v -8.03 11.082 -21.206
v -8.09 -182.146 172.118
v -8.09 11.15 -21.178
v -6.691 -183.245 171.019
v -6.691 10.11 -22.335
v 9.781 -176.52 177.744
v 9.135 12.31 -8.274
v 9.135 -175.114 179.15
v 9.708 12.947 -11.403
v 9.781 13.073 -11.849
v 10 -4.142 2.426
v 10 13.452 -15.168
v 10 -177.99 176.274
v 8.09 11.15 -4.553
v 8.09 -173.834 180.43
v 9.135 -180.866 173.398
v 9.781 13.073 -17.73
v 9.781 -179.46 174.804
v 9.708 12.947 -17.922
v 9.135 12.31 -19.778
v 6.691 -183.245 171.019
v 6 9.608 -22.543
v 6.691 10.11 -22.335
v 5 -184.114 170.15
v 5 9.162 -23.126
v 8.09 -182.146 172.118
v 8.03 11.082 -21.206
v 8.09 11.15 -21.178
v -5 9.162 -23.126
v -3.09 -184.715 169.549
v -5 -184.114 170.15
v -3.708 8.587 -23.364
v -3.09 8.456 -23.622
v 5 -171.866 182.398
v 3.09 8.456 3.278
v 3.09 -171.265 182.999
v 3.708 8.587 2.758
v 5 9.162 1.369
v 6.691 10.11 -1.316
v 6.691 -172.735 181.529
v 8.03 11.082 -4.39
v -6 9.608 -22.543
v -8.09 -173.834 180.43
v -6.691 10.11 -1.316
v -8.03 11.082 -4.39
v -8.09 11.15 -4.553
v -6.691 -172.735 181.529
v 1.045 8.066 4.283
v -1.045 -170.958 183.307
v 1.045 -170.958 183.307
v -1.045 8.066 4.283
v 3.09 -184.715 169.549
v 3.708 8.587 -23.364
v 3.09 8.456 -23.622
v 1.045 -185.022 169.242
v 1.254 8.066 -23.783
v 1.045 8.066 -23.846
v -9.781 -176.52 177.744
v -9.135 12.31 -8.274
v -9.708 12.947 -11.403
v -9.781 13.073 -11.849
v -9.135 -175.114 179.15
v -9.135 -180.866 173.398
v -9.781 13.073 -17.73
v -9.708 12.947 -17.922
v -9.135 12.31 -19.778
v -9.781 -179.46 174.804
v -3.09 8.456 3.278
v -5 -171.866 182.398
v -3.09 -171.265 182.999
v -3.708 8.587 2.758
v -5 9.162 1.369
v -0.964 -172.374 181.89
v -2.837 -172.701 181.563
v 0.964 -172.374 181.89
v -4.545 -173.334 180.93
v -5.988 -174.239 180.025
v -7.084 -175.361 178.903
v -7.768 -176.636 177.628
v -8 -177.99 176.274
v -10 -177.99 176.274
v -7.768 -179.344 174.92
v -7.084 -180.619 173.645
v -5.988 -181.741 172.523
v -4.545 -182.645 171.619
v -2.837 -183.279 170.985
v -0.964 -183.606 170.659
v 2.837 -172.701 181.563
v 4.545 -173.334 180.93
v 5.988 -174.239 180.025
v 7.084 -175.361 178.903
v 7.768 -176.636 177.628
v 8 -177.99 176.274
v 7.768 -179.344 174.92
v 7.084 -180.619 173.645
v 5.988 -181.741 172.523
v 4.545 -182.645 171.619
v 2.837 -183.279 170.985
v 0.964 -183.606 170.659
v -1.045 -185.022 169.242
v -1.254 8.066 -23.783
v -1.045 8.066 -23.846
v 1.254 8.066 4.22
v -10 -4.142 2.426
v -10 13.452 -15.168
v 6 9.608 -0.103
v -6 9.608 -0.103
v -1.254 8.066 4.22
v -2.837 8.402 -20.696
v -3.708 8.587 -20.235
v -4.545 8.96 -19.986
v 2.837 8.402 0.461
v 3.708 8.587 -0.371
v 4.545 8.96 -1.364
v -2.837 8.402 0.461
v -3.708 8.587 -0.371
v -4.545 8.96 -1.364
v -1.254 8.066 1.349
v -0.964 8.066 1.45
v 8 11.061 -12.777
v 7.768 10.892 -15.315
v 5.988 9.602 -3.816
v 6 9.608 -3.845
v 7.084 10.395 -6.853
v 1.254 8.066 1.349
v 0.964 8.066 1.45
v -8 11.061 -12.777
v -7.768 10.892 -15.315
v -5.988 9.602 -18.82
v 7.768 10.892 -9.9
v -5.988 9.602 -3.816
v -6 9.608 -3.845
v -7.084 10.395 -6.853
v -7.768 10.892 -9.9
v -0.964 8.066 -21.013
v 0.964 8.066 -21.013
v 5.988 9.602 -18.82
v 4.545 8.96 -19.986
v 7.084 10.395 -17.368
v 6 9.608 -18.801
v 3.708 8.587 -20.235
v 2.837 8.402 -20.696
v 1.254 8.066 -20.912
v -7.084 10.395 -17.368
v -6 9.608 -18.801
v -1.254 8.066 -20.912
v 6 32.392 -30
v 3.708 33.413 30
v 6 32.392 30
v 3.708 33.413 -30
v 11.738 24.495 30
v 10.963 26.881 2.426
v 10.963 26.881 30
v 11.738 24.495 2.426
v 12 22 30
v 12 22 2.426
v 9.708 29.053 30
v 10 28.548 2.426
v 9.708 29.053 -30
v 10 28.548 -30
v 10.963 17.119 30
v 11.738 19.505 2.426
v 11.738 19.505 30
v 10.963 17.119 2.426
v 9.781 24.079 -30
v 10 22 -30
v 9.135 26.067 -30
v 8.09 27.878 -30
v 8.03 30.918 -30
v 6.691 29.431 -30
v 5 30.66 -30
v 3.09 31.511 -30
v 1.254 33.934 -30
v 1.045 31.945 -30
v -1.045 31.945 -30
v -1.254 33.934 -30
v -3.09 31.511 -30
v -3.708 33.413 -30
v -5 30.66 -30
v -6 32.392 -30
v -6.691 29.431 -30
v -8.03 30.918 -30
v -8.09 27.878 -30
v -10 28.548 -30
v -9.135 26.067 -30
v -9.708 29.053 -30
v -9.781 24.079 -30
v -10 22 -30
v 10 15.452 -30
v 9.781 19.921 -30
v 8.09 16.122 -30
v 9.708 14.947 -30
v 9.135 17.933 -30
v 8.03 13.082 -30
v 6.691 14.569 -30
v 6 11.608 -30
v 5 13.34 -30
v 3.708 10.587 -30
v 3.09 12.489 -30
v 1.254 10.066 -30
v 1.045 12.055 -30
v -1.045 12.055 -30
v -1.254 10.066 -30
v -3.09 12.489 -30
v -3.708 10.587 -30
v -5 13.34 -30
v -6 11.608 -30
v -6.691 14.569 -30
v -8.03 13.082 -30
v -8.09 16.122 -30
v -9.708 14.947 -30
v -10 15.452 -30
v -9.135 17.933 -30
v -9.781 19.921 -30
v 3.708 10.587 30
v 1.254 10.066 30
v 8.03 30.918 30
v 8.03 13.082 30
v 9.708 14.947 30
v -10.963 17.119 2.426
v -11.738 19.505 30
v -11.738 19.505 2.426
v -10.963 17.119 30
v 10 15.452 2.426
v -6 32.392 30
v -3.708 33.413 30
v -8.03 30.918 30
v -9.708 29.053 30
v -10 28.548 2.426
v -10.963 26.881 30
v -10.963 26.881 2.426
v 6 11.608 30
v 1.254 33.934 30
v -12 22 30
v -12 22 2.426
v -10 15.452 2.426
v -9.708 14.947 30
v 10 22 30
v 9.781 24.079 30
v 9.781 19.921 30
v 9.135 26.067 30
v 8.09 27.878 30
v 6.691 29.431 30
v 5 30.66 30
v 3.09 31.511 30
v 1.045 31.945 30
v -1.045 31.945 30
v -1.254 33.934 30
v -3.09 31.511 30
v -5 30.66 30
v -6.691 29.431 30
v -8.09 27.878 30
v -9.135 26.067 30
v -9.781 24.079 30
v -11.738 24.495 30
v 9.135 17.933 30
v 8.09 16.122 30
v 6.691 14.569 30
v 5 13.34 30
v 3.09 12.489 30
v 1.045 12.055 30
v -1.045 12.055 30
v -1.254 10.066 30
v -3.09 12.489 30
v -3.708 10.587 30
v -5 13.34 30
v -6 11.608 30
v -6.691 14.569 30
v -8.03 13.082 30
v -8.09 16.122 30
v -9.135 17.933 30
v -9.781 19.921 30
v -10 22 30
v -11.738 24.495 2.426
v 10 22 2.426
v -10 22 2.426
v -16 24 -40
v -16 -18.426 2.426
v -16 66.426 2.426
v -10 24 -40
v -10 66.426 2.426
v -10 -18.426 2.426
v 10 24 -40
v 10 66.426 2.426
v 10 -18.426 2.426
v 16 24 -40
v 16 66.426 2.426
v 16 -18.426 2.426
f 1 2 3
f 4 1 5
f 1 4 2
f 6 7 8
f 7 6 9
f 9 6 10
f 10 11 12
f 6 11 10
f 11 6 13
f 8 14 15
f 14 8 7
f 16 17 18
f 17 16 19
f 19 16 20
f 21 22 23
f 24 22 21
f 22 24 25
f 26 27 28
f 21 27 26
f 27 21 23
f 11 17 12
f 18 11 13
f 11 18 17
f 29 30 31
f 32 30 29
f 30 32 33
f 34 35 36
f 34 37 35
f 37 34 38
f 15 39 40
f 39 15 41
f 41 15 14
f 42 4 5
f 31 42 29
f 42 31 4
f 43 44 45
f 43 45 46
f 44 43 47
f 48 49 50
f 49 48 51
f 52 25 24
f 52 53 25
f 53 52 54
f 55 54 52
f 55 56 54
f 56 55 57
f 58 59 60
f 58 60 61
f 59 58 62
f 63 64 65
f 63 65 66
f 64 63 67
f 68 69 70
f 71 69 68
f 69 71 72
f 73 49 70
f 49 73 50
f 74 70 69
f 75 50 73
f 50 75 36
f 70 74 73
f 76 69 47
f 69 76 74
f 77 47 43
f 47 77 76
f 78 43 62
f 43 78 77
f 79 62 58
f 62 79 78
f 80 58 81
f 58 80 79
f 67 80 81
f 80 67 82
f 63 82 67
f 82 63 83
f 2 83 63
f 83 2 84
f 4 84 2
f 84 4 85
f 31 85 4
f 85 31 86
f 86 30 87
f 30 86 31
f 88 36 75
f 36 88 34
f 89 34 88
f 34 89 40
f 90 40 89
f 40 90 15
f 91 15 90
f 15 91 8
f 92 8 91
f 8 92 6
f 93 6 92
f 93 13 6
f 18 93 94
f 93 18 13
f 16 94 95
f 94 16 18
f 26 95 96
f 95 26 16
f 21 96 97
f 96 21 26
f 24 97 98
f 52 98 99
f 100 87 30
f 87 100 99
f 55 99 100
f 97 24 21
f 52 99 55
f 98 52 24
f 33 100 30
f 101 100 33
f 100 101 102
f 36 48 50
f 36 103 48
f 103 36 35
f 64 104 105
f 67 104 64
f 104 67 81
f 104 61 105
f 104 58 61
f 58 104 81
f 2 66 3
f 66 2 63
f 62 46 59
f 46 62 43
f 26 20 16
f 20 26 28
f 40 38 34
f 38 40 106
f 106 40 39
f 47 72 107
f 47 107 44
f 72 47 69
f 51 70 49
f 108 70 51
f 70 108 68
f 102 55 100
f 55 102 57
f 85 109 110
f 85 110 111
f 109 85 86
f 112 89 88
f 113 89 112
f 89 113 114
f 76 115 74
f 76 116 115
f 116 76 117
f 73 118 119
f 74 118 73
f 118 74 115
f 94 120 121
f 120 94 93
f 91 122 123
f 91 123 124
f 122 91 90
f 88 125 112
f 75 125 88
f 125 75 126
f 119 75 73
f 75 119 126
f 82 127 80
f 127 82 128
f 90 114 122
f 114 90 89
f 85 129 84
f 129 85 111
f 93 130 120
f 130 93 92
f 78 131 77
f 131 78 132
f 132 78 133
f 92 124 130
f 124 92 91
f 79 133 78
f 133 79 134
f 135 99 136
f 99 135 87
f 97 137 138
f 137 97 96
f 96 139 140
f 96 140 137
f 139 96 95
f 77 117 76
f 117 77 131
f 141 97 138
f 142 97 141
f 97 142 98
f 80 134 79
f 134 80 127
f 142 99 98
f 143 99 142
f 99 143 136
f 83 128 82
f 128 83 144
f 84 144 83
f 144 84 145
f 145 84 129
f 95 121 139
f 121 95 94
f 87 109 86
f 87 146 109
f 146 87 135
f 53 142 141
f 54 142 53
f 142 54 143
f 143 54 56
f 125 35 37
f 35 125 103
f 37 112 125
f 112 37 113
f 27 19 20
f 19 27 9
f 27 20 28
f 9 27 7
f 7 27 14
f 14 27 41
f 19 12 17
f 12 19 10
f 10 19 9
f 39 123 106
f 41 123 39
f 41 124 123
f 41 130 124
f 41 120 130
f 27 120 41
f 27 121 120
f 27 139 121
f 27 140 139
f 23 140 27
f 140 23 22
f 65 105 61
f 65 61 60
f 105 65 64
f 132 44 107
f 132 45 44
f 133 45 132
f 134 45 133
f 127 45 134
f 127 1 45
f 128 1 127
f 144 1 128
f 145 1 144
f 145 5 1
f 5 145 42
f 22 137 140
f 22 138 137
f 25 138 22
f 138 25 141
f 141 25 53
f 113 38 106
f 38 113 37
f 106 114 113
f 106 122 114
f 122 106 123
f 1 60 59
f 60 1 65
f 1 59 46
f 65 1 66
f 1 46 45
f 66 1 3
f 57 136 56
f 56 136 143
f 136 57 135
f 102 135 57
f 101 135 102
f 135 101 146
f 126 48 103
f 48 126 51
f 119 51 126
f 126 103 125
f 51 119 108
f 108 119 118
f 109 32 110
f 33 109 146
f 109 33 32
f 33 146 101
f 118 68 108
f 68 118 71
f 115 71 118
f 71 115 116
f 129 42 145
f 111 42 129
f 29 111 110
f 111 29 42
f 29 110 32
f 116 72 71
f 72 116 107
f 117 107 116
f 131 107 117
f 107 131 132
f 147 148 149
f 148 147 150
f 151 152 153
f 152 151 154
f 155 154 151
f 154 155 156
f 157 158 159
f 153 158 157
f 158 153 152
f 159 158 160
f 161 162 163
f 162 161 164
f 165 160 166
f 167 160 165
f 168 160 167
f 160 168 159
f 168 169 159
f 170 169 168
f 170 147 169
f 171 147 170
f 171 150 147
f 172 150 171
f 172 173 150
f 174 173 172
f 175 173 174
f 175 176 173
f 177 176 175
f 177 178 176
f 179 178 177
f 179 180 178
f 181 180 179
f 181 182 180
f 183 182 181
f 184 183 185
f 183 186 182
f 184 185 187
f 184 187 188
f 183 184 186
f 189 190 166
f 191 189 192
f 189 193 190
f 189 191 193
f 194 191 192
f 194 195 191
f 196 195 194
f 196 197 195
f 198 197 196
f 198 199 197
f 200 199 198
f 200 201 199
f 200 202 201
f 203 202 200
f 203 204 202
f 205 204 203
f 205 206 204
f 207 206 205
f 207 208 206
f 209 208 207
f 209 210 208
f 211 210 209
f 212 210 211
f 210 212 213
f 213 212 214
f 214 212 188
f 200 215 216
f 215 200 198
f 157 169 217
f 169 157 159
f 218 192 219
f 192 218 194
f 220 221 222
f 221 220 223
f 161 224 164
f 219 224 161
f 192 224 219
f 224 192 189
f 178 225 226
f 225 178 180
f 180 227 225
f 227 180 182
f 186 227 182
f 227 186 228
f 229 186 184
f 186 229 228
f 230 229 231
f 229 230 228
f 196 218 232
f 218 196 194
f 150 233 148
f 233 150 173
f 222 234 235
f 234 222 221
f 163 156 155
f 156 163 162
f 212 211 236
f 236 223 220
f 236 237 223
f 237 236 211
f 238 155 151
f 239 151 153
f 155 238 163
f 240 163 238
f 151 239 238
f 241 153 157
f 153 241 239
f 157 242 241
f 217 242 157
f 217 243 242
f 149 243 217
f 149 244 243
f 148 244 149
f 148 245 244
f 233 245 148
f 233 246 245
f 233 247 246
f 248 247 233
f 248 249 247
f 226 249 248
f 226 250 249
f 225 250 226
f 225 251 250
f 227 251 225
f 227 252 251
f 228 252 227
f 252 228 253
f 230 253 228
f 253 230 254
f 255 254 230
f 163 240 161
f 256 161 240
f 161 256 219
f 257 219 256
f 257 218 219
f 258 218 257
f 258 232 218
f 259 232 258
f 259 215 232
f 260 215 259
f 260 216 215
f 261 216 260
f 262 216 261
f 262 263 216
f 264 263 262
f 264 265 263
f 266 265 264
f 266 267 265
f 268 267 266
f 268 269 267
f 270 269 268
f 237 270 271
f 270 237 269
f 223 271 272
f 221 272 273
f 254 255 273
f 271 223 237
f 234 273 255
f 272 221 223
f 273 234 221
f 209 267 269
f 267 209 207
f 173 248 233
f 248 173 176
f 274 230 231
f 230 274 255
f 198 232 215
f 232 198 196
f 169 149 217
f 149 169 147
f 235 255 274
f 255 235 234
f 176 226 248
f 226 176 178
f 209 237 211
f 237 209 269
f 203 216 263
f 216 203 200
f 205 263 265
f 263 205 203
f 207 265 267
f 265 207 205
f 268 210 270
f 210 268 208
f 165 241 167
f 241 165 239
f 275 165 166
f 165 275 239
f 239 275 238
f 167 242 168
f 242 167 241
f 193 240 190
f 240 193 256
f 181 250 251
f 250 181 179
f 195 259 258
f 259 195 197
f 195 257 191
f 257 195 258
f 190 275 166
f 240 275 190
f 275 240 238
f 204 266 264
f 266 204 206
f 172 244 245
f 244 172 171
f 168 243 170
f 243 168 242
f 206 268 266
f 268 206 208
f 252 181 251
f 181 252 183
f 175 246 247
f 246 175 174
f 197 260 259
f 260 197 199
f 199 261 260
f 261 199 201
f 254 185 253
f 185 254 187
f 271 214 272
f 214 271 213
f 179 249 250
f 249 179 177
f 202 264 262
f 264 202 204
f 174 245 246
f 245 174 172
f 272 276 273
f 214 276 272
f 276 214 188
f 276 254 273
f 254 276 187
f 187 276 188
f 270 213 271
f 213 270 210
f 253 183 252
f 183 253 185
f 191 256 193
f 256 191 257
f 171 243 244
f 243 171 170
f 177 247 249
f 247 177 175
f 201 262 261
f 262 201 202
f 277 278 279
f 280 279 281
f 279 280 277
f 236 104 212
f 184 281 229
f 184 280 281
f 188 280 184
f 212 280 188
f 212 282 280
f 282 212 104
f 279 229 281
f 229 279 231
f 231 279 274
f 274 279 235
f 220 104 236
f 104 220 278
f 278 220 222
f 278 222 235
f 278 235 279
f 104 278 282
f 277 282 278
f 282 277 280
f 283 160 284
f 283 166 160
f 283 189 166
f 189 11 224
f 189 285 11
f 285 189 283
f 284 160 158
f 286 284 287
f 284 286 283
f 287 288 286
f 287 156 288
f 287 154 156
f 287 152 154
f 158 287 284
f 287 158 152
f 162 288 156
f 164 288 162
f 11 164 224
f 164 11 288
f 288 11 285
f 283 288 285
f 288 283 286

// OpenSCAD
module tube(od, id, h){
  difference(){
    cylinder(d=od, h=h);
    translate([0, 0, -1])cylinder(d=id, h=h + 2);
  }
}

OD = 20;
ID = 16;
//t=20;
//rotate([22.5 * sin(t * 360) - 45 + 22.5, 0, 0])
translate([0, OD ,-50]){
  difference(){
    rotate([45, 0, 0])translate([0, OD, 0])tube(OD, ID, 300);
    cylinder(h=100, d=OD + 4);
    translate([-50, 0, 0])cube(100);
  }
}

translate([0, OD+2, -30])tube(OD+4, ID+4, 60);

translate([-OD/2-6, OD + 4, -2 * OD])rotate([90+45, 0, 0])rotate([0, 90, 0])linear_extrude(height=6)scale(3* OD)polygon(points=[[0, 0], [1, 0], [0, 1]]);
translate([OD/2, OD + 4, -2 * OD])rotate([90+45, 0, 0])rotate([0, 90, 0])linear_extrude(height=6)scale(3* OD)polygon(points=[[0, 0], [1, 0], [0, 1]]);
